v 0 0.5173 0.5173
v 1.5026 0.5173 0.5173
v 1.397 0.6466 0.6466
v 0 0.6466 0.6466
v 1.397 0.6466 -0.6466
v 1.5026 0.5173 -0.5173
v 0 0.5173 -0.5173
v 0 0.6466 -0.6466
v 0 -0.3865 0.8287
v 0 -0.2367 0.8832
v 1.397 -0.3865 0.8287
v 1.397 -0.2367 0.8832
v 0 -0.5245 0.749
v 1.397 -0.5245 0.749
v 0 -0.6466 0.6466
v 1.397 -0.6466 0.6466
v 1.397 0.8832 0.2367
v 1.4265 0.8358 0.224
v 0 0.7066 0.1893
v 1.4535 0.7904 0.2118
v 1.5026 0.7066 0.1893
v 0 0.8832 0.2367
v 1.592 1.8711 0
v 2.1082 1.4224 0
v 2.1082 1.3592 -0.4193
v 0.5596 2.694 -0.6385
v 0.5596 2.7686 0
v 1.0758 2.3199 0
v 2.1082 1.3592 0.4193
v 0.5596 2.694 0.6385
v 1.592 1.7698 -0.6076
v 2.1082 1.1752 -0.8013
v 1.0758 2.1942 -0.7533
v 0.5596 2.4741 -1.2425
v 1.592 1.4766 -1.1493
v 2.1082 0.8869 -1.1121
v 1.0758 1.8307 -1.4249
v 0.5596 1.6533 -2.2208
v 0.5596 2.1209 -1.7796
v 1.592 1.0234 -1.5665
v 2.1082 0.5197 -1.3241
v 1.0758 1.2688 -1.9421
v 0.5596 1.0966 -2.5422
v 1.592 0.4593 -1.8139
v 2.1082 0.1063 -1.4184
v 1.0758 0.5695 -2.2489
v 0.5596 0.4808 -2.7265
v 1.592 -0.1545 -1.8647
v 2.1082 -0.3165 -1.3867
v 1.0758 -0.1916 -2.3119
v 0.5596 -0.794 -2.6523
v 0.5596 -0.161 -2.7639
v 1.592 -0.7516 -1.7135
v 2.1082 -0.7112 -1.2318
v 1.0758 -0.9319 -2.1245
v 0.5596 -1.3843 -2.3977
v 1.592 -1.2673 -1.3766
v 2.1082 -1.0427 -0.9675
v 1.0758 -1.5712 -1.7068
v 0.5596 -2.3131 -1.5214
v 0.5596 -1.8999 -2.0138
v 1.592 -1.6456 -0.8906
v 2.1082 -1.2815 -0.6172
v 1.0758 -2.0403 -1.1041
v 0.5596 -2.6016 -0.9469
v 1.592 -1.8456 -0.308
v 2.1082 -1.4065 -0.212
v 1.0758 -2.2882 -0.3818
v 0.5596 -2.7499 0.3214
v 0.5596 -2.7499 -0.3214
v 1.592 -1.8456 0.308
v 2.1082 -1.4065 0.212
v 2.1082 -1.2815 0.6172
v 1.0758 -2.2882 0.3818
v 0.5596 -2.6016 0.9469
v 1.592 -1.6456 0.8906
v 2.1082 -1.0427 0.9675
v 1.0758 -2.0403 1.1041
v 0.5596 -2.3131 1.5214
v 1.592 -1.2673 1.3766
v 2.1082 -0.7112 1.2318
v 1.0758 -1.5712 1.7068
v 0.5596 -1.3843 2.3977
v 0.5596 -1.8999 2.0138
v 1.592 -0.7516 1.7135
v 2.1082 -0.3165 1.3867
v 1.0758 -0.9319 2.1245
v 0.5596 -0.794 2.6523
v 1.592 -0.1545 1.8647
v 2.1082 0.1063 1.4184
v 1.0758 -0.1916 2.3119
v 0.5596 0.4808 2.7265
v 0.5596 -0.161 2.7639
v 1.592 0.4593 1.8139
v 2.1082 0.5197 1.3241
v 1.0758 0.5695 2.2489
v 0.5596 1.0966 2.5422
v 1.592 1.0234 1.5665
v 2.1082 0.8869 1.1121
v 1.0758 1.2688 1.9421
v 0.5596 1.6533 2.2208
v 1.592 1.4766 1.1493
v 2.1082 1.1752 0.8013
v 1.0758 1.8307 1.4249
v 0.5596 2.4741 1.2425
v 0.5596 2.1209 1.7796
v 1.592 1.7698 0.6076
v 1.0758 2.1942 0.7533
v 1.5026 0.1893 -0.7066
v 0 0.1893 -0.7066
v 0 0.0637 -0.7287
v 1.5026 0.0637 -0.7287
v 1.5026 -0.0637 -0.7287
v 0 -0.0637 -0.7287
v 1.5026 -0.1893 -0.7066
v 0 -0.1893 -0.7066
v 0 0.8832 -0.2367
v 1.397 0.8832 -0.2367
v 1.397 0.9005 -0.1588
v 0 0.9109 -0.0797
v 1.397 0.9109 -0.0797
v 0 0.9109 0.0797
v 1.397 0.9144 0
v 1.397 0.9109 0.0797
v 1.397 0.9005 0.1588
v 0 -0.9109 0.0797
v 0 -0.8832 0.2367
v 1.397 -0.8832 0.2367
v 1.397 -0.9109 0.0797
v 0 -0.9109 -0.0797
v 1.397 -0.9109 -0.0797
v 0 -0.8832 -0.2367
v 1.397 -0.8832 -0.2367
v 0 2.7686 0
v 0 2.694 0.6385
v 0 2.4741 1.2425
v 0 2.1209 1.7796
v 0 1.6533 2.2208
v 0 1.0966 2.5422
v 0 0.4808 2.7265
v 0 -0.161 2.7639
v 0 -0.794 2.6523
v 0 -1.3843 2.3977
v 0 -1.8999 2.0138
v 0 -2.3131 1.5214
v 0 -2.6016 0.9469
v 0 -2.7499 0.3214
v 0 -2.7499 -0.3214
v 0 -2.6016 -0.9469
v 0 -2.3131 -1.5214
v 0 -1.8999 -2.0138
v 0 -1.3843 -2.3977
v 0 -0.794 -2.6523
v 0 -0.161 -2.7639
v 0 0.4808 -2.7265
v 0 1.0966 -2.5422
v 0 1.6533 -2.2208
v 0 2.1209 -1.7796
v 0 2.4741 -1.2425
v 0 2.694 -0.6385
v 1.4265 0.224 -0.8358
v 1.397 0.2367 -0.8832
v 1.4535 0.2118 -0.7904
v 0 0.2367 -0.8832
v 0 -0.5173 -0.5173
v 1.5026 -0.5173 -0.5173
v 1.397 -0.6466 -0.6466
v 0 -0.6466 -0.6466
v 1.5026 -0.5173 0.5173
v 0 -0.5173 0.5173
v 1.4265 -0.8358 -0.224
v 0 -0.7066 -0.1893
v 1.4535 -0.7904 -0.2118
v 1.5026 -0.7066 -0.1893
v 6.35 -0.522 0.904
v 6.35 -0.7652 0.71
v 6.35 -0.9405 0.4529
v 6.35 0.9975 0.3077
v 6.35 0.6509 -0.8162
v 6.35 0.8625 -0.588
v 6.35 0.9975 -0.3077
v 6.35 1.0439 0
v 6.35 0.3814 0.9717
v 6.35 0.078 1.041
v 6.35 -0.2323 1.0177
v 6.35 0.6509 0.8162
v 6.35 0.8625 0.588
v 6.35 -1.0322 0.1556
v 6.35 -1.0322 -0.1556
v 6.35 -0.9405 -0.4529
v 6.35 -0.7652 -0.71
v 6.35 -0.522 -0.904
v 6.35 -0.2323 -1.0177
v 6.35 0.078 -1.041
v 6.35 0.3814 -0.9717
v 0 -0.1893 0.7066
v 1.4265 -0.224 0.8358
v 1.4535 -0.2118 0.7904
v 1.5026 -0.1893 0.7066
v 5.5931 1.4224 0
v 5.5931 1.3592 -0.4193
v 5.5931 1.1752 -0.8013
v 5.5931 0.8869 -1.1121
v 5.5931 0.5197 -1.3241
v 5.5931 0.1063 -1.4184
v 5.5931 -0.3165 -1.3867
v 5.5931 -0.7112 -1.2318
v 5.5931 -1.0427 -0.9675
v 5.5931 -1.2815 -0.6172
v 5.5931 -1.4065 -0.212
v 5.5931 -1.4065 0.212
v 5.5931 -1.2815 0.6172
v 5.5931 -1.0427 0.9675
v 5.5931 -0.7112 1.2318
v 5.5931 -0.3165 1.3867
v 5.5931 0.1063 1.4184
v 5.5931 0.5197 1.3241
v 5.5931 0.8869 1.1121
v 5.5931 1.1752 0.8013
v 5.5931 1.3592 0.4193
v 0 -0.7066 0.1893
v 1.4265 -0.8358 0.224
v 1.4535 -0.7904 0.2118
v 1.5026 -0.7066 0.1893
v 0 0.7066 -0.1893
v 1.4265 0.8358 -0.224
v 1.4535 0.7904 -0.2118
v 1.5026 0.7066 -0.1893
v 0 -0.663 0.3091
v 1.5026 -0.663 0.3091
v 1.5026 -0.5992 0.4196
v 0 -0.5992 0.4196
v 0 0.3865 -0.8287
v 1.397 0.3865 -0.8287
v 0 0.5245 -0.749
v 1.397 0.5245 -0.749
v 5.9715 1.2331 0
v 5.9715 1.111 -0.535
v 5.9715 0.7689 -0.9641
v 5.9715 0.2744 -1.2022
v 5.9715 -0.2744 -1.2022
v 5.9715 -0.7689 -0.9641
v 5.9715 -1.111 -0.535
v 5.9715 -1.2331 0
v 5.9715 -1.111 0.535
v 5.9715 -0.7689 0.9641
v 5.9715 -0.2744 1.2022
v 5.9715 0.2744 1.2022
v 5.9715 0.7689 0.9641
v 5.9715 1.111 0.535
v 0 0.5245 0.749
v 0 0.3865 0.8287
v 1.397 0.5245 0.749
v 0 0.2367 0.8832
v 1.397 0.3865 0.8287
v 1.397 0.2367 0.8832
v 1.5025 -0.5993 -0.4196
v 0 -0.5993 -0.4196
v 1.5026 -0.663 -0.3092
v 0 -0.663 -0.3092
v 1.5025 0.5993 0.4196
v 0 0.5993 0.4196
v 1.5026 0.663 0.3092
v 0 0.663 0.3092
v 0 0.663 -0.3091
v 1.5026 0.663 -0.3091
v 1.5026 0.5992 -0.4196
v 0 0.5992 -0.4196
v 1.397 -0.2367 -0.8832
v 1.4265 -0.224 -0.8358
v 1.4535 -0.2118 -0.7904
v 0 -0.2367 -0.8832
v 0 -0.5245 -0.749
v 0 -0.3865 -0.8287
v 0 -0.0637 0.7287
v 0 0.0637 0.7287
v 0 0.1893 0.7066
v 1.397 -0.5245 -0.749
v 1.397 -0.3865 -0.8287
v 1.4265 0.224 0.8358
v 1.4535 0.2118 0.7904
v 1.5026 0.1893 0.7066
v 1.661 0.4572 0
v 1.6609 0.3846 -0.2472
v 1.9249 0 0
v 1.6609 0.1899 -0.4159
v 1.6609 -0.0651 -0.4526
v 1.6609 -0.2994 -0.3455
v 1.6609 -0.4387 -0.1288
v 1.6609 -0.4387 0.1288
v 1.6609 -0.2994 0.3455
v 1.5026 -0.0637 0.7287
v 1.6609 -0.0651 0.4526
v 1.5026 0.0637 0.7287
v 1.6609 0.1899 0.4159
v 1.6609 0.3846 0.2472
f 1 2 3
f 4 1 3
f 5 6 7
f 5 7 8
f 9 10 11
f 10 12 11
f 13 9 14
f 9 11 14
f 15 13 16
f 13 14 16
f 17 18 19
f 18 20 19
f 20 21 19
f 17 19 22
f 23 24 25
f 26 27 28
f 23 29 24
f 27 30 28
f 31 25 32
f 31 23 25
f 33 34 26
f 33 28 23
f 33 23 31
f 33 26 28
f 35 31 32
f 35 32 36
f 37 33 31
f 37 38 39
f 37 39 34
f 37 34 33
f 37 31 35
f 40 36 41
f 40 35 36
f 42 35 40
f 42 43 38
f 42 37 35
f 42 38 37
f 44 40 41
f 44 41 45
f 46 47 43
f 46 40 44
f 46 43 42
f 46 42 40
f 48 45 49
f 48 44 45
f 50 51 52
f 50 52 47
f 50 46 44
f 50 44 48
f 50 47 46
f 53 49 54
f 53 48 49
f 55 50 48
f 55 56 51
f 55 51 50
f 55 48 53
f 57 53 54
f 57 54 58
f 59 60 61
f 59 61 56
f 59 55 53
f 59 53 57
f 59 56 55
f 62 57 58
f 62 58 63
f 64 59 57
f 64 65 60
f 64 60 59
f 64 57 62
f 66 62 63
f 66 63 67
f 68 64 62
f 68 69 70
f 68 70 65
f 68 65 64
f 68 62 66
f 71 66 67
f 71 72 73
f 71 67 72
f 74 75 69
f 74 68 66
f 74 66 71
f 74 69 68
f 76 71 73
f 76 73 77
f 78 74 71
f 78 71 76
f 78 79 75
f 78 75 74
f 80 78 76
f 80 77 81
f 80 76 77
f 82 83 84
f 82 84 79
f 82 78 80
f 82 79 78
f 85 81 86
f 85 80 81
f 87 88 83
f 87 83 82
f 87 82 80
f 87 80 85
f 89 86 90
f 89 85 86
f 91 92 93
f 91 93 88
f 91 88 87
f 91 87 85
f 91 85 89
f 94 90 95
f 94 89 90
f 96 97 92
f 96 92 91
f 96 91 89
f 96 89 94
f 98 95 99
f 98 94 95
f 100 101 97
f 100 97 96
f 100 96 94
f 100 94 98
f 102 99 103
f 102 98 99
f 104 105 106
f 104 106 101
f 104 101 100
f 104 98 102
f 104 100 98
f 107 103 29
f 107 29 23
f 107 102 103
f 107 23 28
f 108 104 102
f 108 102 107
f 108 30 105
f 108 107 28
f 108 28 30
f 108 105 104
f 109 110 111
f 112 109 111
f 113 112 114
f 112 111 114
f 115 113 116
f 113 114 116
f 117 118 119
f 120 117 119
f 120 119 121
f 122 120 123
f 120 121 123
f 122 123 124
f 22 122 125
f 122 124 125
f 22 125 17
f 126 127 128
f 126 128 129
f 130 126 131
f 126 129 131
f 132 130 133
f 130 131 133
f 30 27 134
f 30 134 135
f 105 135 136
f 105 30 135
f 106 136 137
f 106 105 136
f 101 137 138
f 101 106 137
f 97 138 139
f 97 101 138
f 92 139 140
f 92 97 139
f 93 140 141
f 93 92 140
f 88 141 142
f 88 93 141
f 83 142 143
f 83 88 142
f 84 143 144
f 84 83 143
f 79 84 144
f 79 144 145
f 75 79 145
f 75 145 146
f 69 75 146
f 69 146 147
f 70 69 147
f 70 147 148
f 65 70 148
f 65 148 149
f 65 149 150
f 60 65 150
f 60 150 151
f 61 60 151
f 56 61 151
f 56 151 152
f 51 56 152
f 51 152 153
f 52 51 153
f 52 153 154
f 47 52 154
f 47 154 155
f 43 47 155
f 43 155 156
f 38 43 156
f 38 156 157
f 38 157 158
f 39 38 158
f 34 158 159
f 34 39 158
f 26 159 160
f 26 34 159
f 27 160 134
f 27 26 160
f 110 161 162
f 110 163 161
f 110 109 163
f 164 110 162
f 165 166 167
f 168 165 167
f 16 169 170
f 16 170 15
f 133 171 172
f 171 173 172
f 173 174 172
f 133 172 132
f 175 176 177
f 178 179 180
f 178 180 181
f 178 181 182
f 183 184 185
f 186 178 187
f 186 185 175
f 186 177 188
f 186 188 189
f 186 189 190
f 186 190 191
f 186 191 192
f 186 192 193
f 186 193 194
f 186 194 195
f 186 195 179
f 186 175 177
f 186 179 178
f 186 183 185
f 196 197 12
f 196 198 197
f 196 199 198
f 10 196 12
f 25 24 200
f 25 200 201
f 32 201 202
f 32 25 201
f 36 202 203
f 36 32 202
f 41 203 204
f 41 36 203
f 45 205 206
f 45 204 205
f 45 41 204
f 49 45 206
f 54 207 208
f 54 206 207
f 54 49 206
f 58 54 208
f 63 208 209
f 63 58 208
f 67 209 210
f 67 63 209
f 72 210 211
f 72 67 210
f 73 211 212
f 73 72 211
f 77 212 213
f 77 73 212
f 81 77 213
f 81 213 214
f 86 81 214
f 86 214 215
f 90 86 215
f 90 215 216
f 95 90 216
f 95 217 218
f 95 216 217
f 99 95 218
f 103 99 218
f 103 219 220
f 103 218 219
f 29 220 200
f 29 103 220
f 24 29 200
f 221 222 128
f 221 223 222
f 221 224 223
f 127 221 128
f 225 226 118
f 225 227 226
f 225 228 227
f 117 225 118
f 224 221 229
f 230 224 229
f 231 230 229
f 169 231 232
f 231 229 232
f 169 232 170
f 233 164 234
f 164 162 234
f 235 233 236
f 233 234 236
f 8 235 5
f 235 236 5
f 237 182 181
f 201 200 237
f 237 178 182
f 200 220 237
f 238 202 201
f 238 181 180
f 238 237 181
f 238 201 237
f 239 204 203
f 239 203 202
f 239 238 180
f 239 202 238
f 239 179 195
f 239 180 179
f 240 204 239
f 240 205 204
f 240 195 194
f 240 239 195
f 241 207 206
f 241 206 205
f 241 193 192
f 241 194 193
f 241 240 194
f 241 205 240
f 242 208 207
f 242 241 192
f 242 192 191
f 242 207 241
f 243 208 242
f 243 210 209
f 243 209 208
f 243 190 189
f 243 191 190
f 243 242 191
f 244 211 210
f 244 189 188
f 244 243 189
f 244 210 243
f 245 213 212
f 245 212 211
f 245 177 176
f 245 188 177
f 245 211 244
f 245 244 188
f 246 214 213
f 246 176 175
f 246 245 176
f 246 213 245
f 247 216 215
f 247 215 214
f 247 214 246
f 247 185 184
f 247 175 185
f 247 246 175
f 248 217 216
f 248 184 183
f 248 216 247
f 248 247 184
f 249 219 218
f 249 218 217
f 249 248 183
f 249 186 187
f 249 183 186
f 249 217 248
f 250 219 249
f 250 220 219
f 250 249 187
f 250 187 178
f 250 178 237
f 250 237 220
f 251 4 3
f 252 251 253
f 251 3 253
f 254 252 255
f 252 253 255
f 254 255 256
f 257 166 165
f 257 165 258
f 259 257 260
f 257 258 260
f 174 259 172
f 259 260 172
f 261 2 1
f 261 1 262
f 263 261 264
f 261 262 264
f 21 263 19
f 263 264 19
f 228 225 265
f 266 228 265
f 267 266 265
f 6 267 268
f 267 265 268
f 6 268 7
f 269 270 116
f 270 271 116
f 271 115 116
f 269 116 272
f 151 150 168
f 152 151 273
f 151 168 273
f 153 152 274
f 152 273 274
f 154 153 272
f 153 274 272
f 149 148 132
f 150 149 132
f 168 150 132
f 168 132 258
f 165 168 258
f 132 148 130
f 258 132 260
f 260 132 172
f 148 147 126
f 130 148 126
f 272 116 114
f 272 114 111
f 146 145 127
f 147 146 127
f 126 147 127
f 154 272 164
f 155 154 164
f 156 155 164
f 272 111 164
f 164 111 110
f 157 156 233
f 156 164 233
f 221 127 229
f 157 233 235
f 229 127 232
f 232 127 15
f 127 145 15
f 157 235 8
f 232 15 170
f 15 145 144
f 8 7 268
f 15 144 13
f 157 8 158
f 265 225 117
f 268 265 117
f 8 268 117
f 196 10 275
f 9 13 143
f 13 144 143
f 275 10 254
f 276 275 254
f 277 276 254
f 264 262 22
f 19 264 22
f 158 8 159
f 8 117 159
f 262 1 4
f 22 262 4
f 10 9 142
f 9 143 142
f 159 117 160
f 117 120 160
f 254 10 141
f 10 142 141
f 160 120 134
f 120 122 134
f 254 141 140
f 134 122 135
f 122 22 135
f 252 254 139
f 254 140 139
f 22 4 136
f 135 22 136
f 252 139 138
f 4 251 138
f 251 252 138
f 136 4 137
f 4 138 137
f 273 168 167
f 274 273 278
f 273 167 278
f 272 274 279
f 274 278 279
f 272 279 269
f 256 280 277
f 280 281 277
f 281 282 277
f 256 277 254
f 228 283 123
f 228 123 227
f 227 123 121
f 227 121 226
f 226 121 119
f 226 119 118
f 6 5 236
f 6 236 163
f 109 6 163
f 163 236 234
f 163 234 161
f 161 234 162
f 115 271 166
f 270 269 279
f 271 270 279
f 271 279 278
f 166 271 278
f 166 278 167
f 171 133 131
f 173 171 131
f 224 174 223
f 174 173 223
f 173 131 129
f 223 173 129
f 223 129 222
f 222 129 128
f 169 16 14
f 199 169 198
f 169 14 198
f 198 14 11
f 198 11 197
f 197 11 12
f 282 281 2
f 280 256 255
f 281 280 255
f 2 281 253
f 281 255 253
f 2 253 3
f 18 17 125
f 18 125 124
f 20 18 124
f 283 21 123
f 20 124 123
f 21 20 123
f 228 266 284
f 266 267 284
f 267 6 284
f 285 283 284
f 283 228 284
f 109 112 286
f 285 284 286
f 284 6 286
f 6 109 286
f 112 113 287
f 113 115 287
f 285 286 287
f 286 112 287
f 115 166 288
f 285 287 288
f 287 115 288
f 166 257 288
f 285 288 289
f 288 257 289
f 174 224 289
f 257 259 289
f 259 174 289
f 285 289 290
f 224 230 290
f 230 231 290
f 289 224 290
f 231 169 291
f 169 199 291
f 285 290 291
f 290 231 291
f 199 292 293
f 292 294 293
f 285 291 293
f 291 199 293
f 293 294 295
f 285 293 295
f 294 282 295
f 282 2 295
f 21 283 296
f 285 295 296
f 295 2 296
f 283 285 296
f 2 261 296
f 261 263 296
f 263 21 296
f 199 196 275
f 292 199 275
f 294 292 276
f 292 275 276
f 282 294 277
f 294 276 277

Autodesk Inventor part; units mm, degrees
ref_plane "YZ Plane" through (0, 0, 0) normal (1, 0, 0) x (0, 1, 0)
ref_plane "XZ Plane" through (0, 0, 0) normal (0, 1, 0) x (-1, 0, 0)
sketch "Szkic1" plane through (0, 0, 0) normal (0, 0, 1) x (1, 0, 0)
  line L0 (6.35, 0) -> (6.35, 1.4224)
  line L1 (6.35, 1.4224) -> (2.1082, 1.4224)
  line L2 (0, 2.7686) -> (0, 0.9144)
  line L3 (0, 0.9144) -> (1.397, 0.9144)
  line L4 (1.397, 0.9144) -> (1.9249, 0)
  line L5 (1.9249, 0) -> (6.35, 0)
  line L6 (0, 2.7686) -> (0.5596, 2.7686)
  line L7 (0.5596, 2.7686) -> (2.1082, 1.4224)
  line L8 (-1.27, 0) -> (7.62, 0) projected
  line L9 (0, -0.5537) -> (0, 3.3223) projected
  dimension "d0" = 6.35
  dimension "d1" = 1.397
  dimension "d2" = 2.8448
  dimension "d3" = 2.1082
  dimension "d4" = 41
  dimension "d5" = 1.8288
  dimension "d6" = 60
  dimension "d7" = 5.5372
revolve "Bryła" add sketch "Szkic1" angle 360 about axis through (1.9249, 0, 0) along (1, 0, 0) contours L5 L4 L3 L2 L6 L7 L1 L0
sketch "Szkic2" plane through (0, 0, 0) normal (-1, 0, 0) x (0, 0, 1)
  circle A0 centre (0, 0) radius 2.7686 projected
  circle A1 centre (0, 0) radius 0.9144 projected
  line L0 (0.7066, 0.1893) -> (0.8832, 0.2367)
  line L1 (0.7066, -0.1893) -> (0.8832, -0.2367)
  arc A2 (0.7066, -0.1893) -> (0.7066, 0.1893) centre (0, 0) ccw
  arc A3 (0.8832, -0.2367) -> (0.8832, 0.2367) centre (0, 0) ccw
  line L2 (0, -3.876) -> (0, 3.876) projected
  line L3 (-3.876, 0) -> (3.876, 0) projected
  line L4 (0.7066, 0.1893) -> (0, 0) construction
  line L5 (0, 0) -> (0.7066, -0.1893) construction
  line L6 (0.1893, 0.7066) -> (0.2367, 0.8832)
  line L7 (0.5173, 0.5173) -> (0.6466, 0.6466)
  arc A4 (0.5173, 0.5173) -> (0.1893, 0.7066) centre (0, 0) ccw
  arc A5 (0.6466, 0.6466) -> (0.2367, 0.8832) centre (0, 0) ccw
  line L8 (-0.5173, 0.5173) -> (-0.6466, 0.6466)
  line L9 (-0.1893, 0.7066) -> (-0.2367, 0.8832)
  arc A6 (-0.1893, 0.7066) -> (-0.5173, 0.5173) centre (0, 0) ccw
  arc A7 (-0.2367, 0.8832) -> (-0.6466, 0.6466) centre (0, 0) ccw
  line L10 (-0.7066, -0.1893) -> (-0.8832, -0.2367)
  line L11 (-0.7066, 0.1893) -> (-0.8832, 0.2367)
  arc A8 (-0.7066, 0.1893) -> (-0.7066, -0.1893) centre (0, 0) ccw
  arc A9 (-0.8832, 0.2367) -> (-0.8832, -0.2367) centre (0, 0) ccw
  line L12 (-0.1893, -0.7066) -> (-0.2367, -0.8832)
  line L13 (-0.5173, -0.5173) -> (-0.6466, -0.6466)
  arc A10 (-0.5173, -0.5173) -> (-0.1893, -0.7066) centre (0, 0) ccw
  arc A11 (-0.6466, -0.6466) -> (-0.2367, -0.8832) centre (0, 0) ccw
  line L14 (0.5173, -0.5173) -> (0.6466, -0.6466)
  line L15 (0.1893, -0.7066) -> (0.2367, -0.8832)
  arc A12 (0.1893, -0.7066) -> (0.5173, -0.5173) centre (0, 0) ccw
  arc A13 (0.2367, -0.8832) -> (0.6466, -0.6466) centre (0, 0) ccw
  dimension "d8" = 1.463
  dimension "d9" = 1.8288
  dimension "d10" = 15
  dimension "d11" = 15
  dimension "d22" = 360
extrude "Szczelina" add sketch "Szkic2" against normal up to next contours L3 A2 L0 A1 | A1 L1 A2 L3 | L3 A8 L10 A1 | A1 L11 A8 L3 | A1 L7 A4 L6 | L9 A6 L8 A1 | A1 L13 A10 L12 | L15 A12 L14 A1
thread "Gwint" size "4-40 UNC" class "2A" standard "ANSI Unified Screw Threads" length 2.6543
chamfer "Faza1" distance 0.3785 distance2 0.7569 1 edges at (6.35, -1.4224, 0) measured on face at (6.35, -0.1427, 0.3949)
ref_plane "Work Plane1" through (66.6877, 0, 0) normal (0, 0, -1) x (1, 0, 0)
equation "\"d0\" = NLG"
equation "\"d1\" = INTI"
equation "\"d2\" = GD"
equation "\"d3\" = KOH"
equation "\"d4\" = 0.5 * SEWI"
equation "\"d5\" = SW"
equation "\"d7\" = KOD"
equation "\"d8\" = 0.8 * SW"
equation "\"d9\" = SW"
equation "\"d15\" = GEL"
equation "\"d17\" = -0.5 * SPD + 0.5 * GD"
equation "\"d18\" = GUL"
equation "\"NLG\" = 6.35"
equation "\"SW\" = 1.8288"
equation "\"INTI\" = 1.397"
equation "\"GEL\" = 2.6543"
equation "\"KOH\" = 2.1082"
equation "\"KOD\" = 5.5372"
equation "\"GUL\" = 0.75692"
equation "\"SPD\" = 2.08788"
equation "\"GD\" = NND"
equation "\"SEWI\" = 82deg"
equation "\"TOA\" = 30deg"
equation "\"GD1\" = SPD"
equation "\"EPV\" = 3.74448"
equation "\"THREADDIA\" = 2.8448"
equation "\"BDM\" = NND"
equation "\"NND\" = 2.8448"
equation "\"GAL\" = 1.5875"
equation "\"E0\" = 1.155 * SW"
properties part number "ANSI B18.3 - 4-40 UNC x 0,25" material "Stal, miękka"
